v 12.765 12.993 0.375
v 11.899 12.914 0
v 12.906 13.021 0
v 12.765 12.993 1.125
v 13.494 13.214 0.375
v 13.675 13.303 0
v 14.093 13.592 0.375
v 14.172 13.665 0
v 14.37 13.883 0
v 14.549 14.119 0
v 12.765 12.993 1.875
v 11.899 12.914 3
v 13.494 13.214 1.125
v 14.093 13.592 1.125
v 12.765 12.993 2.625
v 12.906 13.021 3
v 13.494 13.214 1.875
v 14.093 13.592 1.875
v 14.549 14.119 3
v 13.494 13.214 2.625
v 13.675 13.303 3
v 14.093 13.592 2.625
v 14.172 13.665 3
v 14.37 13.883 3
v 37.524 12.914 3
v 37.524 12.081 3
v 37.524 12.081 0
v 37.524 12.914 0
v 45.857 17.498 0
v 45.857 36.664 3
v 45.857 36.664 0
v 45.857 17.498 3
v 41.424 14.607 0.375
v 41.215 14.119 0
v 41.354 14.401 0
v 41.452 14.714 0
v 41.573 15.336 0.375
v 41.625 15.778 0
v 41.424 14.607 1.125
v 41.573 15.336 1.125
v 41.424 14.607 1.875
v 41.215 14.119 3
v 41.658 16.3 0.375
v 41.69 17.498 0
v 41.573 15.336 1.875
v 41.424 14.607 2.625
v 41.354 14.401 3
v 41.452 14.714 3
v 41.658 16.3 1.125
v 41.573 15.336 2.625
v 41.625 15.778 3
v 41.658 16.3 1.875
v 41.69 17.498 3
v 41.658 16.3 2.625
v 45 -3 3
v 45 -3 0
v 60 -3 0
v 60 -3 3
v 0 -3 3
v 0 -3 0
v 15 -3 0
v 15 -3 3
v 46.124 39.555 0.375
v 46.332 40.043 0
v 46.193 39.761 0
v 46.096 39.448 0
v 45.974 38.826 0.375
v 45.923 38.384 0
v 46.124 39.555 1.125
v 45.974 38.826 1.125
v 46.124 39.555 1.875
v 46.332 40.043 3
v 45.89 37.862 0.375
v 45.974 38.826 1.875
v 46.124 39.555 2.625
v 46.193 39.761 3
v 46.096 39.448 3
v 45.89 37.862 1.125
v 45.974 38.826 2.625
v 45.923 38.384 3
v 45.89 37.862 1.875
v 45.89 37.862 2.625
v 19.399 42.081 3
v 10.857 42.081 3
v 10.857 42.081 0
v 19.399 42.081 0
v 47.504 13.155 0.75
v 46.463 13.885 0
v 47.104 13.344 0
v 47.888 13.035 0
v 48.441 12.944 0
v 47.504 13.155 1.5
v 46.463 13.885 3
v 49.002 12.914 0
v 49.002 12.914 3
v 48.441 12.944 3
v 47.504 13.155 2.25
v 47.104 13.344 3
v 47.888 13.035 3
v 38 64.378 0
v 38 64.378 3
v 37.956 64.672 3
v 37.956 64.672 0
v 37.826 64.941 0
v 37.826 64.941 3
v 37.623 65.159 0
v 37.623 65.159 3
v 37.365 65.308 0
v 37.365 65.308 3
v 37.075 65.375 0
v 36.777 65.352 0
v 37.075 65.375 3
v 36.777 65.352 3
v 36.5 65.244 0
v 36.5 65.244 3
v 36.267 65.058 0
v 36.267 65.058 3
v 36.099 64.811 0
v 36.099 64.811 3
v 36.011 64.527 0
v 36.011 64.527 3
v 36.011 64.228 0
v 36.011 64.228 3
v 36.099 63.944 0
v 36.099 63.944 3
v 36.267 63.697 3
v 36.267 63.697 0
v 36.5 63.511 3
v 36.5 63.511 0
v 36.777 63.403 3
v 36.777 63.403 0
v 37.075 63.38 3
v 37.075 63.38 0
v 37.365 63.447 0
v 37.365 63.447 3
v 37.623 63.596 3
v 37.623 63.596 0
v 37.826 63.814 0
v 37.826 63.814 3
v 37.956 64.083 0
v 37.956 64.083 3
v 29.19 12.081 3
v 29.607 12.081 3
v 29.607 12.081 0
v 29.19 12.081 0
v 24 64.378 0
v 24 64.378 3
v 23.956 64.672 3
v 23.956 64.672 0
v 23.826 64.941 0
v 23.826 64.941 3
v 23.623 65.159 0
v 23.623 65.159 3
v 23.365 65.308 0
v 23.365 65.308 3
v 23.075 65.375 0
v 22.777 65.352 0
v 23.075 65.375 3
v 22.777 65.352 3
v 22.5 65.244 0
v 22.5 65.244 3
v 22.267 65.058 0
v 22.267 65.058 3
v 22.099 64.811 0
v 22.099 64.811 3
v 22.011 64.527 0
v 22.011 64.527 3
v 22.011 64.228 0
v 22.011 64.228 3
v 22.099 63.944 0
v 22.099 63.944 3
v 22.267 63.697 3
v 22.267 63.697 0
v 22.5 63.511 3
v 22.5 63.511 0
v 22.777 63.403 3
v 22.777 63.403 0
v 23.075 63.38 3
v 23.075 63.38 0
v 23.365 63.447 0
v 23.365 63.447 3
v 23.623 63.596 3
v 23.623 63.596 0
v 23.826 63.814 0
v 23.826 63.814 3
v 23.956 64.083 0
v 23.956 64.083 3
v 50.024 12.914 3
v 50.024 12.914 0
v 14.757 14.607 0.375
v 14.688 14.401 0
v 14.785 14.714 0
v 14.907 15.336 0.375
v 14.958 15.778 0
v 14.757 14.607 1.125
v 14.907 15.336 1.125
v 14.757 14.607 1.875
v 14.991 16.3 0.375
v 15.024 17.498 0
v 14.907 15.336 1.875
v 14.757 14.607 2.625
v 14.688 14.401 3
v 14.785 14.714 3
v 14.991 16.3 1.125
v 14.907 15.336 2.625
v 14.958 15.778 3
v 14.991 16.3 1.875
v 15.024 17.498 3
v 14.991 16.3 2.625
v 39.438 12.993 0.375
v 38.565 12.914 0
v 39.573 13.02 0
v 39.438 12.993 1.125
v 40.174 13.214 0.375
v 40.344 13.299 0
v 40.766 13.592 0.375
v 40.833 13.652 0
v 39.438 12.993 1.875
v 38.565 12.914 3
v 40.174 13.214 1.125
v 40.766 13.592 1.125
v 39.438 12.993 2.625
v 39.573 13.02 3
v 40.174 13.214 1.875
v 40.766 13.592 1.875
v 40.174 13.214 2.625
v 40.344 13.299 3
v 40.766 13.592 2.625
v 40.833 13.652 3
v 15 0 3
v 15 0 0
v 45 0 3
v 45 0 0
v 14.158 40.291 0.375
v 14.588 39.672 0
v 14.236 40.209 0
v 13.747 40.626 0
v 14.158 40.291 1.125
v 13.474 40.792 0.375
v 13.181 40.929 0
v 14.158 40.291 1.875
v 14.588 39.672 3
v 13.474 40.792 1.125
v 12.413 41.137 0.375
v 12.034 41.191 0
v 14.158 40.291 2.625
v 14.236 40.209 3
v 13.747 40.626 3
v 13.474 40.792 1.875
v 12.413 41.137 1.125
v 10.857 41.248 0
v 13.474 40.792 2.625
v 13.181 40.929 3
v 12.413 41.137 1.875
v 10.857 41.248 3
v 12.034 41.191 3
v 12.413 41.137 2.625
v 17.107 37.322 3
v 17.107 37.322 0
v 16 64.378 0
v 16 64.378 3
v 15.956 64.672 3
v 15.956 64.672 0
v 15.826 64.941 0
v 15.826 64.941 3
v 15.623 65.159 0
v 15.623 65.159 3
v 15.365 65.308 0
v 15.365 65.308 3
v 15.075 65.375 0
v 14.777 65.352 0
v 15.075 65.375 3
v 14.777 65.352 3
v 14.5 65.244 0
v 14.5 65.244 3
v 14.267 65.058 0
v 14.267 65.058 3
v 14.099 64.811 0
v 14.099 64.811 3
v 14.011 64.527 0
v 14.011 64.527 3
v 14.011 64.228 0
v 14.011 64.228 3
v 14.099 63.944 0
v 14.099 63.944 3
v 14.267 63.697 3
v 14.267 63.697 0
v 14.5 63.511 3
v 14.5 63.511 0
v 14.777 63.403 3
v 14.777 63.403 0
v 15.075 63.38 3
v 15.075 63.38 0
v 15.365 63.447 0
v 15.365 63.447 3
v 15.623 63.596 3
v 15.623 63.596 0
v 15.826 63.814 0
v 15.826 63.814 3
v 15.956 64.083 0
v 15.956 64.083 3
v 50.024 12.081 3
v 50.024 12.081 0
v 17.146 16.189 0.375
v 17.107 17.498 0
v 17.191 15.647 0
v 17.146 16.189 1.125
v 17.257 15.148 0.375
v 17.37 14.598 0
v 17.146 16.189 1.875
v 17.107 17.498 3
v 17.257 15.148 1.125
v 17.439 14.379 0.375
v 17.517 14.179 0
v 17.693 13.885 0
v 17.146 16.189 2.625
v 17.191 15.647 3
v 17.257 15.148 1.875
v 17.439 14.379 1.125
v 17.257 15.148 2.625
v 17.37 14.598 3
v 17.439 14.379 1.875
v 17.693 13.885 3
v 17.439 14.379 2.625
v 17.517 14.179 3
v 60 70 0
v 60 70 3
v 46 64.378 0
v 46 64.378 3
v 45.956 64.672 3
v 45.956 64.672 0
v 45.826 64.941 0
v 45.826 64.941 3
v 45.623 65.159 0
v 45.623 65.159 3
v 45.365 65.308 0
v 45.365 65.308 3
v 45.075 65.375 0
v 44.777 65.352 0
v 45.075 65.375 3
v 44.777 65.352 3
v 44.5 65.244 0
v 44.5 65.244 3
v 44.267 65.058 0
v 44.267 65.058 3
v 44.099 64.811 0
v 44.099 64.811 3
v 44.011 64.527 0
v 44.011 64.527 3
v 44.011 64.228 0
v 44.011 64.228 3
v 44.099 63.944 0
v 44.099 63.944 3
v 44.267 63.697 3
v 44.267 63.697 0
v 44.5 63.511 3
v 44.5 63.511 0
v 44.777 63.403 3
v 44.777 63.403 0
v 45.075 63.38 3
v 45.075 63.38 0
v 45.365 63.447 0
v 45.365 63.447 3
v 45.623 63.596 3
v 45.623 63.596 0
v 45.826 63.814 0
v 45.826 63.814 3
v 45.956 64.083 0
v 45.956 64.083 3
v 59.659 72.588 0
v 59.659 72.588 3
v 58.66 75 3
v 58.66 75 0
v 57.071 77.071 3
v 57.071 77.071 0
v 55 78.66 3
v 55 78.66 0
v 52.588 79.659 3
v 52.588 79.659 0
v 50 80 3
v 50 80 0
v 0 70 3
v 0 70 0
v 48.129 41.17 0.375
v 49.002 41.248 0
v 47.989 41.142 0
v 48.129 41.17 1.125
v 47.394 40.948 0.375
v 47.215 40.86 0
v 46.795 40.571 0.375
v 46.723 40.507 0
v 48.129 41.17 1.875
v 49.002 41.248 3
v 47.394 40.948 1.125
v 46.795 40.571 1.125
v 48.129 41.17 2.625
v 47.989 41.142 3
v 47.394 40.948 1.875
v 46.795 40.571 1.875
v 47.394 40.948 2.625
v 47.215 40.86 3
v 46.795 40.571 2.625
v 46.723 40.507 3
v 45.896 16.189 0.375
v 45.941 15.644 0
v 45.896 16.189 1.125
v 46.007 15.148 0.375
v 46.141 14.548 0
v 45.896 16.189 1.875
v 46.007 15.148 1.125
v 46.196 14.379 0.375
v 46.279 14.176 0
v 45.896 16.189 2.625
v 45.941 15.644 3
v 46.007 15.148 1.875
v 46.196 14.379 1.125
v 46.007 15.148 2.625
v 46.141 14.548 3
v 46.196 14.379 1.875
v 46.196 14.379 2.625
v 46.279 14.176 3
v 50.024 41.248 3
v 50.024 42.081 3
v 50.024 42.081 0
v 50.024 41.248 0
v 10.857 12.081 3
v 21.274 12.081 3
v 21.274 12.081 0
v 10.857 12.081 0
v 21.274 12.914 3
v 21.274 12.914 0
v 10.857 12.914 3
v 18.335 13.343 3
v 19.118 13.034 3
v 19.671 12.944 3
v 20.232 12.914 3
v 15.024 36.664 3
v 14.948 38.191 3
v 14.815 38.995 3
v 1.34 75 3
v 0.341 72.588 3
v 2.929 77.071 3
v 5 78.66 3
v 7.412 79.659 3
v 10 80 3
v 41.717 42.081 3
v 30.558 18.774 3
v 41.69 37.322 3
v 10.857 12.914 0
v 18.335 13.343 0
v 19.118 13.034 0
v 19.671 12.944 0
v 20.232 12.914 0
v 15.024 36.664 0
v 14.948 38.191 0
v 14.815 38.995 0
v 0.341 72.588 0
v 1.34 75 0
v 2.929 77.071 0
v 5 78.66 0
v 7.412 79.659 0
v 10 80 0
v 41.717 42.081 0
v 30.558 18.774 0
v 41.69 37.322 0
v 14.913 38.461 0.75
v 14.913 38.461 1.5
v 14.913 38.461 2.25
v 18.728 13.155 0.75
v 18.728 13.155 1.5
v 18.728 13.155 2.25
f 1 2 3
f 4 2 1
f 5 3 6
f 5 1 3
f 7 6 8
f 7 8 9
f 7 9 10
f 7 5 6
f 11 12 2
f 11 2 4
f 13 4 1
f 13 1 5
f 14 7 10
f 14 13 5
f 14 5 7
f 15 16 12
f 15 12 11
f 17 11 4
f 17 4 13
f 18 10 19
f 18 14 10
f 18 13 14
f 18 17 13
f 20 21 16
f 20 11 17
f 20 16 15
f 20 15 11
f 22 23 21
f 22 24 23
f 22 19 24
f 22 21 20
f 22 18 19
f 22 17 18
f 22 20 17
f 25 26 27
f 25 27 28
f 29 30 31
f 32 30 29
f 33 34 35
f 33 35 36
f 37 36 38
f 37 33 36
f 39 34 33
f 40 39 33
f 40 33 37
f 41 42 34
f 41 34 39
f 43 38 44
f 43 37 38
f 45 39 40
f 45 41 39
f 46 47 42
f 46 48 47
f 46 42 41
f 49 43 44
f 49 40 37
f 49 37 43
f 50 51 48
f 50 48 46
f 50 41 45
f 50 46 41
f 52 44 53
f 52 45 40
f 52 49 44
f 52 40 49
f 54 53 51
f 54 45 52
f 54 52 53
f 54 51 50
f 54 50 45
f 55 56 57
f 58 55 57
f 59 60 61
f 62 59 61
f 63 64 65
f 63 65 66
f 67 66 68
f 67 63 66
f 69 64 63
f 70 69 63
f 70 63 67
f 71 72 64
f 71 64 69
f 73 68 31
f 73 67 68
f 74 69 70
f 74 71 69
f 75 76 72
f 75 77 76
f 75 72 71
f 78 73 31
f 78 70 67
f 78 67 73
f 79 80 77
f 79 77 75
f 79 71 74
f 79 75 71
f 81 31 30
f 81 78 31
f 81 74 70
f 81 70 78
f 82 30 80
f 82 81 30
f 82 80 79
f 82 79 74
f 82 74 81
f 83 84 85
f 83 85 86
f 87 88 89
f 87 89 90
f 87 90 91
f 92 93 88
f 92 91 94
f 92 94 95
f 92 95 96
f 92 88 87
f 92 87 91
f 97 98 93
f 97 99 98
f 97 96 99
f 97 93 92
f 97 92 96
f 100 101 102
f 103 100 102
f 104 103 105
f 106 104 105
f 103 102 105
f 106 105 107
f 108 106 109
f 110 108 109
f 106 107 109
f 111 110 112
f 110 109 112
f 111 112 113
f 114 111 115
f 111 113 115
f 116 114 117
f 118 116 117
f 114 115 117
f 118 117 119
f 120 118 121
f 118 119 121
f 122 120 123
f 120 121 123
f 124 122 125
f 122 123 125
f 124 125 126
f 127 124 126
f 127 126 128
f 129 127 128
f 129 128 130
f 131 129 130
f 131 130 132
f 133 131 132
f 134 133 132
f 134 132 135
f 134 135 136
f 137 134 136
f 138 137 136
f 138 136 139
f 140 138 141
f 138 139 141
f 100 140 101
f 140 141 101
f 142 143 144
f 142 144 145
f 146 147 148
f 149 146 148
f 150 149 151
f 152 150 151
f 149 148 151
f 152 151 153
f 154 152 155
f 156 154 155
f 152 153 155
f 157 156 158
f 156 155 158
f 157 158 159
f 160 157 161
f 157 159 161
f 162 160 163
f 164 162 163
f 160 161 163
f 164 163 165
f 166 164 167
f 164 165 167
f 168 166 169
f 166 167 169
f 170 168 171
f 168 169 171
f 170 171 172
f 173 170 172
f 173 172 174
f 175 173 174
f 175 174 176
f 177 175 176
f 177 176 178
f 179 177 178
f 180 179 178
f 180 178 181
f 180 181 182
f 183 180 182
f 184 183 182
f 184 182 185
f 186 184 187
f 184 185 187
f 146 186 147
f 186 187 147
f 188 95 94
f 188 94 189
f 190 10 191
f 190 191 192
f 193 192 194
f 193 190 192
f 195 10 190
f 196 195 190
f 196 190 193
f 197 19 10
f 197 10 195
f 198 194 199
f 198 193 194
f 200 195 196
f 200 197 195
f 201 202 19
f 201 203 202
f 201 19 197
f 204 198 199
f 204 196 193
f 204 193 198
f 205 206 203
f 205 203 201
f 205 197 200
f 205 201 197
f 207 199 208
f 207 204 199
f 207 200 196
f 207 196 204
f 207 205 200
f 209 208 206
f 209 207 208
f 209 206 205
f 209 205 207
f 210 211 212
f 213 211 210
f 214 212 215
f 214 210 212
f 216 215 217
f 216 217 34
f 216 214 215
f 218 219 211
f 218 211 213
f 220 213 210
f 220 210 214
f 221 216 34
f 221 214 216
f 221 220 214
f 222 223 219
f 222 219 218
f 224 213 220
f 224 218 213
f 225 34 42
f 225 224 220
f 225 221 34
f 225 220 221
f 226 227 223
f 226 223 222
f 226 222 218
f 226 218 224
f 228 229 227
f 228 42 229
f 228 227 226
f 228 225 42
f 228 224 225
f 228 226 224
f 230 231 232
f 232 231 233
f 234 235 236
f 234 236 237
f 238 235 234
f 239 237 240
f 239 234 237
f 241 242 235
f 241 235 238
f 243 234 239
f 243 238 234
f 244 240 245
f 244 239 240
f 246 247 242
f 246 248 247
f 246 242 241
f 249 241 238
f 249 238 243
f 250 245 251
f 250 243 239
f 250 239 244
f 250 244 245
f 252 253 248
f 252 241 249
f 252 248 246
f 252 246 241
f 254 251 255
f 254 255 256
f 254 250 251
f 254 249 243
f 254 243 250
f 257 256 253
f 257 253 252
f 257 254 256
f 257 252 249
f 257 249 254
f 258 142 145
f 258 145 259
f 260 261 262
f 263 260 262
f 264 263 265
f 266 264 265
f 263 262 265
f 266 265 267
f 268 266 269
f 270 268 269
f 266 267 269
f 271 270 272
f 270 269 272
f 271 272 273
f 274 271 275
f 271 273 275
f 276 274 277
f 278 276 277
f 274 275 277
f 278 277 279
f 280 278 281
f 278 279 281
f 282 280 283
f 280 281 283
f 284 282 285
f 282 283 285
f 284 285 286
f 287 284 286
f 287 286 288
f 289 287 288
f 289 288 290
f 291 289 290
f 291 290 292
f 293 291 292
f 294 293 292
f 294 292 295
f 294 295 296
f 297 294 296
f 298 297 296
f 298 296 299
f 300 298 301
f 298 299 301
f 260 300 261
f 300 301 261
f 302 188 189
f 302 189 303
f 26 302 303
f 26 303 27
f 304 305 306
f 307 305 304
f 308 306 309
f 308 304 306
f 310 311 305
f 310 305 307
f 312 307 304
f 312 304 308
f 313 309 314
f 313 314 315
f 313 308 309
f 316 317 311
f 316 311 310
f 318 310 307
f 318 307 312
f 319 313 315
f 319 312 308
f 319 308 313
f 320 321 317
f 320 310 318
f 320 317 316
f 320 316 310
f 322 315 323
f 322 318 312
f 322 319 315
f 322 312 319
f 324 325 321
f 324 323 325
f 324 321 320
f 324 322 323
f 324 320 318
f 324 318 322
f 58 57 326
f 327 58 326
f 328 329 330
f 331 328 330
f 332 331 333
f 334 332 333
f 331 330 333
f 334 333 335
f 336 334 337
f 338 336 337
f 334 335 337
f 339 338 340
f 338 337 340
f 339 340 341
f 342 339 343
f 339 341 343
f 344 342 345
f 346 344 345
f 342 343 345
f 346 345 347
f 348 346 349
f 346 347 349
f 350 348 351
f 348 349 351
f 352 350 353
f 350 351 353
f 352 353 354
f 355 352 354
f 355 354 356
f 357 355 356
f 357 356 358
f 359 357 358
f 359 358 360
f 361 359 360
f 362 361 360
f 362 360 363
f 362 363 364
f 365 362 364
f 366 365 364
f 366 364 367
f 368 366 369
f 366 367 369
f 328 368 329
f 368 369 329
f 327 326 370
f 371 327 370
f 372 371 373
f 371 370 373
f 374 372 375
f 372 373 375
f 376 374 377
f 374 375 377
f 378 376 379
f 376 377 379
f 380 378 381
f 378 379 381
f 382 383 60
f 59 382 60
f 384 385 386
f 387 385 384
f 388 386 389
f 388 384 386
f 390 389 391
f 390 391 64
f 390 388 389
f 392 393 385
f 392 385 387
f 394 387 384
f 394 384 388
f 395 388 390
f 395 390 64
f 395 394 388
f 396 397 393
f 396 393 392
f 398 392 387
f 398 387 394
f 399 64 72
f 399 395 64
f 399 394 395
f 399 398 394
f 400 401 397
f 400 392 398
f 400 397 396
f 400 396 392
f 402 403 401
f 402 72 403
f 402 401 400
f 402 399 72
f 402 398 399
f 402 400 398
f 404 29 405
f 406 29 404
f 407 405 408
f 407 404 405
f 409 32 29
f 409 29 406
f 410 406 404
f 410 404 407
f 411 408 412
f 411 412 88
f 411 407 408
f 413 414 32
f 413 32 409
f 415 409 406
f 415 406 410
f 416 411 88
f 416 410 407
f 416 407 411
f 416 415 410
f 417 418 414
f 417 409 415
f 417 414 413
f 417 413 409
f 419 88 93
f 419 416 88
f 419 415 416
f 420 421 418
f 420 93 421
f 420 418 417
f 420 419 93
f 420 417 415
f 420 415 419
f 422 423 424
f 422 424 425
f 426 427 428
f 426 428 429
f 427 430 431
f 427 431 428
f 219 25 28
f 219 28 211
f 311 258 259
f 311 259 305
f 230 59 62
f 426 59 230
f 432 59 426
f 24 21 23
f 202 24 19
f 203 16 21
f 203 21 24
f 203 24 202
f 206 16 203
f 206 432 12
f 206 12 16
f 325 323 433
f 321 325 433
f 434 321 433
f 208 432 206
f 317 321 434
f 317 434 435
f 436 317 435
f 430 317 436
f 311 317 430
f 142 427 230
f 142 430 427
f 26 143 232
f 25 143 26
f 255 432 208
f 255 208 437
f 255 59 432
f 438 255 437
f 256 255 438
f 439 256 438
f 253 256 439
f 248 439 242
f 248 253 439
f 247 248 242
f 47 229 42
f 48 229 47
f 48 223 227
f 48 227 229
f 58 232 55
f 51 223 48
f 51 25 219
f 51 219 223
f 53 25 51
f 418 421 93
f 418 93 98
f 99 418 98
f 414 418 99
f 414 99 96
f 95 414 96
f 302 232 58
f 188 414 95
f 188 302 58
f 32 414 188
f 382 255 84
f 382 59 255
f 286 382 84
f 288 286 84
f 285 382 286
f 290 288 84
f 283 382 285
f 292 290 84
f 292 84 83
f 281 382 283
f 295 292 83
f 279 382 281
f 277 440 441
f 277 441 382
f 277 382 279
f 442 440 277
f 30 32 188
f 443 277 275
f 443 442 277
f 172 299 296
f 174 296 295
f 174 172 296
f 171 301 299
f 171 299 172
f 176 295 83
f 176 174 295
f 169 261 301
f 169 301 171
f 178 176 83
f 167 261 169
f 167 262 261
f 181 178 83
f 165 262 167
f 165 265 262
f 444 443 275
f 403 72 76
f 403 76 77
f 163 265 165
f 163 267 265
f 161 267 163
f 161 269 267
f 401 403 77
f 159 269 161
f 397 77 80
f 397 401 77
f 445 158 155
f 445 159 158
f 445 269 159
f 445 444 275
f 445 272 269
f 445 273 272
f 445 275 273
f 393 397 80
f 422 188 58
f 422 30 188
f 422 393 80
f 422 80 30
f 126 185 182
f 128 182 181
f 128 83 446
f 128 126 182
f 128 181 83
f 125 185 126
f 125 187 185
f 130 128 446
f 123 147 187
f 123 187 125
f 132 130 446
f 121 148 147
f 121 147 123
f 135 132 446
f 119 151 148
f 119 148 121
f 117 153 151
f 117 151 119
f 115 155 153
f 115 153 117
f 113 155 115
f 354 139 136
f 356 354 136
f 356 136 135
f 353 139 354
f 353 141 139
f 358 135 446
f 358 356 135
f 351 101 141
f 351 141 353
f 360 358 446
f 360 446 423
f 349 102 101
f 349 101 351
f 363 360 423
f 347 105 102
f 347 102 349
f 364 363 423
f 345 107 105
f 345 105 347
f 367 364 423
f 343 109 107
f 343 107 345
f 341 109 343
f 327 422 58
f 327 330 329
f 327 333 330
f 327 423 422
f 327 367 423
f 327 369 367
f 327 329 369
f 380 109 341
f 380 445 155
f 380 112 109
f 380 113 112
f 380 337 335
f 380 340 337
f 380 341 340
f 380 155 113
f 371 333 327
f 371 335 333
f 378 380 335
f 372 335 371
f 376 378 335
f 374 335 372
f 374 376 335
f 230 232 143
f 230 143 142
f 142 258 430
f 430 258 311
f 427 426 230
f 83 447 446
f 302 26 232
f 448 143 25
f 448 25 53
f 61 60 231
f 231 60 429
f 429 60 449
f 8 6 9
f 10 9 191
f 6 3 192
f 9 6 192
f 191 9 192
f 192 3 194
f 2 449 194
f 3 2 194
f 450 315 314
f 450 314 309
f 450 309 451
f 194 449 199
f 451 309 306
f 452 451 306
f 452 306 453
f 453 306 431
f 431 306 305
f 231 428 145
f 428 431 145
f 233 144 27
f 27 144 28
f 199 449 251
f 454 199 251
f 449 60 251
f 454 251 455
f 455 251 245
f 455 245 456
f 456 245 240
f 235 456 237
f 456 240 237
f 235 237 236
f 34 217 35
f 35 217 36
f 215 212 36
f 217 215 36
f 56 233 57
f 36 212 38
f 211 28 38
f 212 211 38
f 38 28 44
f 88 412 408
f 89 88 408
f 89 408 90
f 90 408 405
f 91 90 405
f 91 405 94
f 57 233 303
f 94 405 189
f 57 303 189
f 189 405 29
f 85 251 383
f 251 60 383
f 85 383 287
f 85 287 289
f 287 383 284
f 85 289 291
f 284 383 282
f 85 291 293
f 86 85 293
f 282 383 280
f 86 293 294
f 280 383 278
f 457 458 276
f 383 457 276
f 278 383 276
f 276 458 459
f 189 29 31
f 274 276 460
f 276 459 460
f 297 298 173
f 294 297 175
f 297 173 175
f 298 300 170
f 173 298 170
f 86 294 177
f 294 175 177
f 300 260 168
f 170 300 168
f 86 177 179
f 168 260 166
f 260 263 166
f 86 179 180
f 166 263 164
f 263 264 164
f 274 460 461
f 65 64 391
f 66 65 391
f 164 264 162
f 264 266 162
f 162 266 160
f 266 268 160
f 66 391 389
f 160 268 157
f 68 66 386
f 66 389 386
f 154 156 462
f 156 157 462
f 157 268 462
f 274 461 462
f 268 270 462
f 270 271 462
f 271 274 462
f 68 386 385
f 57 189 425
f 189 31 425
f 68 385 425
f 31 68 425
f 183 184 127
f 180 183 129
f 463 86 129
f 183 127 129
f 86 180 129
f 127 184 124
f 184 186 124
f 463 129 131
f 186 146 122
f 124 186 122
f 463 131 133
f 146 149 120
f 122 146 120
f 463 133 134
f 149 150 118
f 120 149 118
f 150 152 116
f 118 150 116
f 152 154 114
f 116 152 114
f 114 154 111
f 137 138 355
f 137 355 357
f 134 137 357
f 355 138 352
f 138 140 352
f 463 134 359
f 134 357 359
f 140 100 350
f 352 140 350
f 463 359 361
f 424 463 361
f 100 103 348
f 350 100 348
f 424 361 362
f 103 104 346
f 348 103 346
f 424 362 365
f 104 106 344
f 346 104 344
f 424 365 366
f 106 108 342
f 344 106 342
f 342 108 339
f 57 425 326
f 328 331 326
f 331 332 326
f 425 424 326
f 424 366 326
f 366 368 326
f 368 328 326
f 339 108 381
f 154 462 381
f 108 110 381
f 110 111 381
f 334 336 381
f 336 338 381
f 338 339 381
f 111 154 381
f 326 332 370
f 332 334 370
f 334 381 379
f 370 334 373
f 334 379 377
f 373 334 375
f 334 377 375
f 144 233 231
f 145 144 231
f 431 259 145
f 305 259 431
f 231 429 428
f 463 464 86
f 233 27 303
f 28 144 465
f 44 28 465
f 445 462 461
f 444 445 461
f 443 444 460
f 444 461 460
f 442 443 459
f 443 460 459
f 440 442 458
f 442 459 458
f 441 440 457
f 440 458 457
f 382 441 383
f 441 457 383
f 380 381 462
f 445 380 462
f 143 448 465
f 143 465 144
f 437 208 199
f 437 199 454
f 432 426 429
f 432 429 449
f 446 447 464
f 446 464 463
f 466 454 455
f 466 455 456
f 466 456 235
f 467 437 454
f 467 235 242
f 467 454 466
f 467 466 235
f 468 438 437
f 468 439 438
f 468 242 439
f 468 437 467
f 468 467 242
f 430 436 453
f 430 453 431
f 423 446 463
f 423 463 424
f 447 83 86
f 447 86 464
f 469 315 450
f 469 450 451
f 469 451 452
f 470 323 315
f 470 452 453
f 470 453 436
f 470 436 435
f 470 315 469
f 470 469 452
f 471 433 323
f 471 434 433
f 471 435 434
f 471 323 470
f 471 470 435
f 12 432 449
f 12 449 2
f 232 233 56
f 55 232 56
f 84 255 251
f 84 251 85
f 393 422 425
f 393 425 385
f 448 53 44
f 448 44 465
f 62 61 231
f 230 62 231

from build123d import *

# Parameters (mm, degrees)
BOSS_EXTRUDE1_DEPTH = 3
CUT_EXTRUDE1_DEPTH  = 3
SKETCH3_R           = 1
CUT_EXTRUDE2_DEPTH  = 3


with BuildPart() as part:
    # Sketch1 → Boss-Extrude1 (new body)
    with BuildSketch(Plane.XY):
        with BuildLine():
            Line((15, 0), (45, 0))
            Line((45, 0), (45, -3))
            Line((45, -3), (60, -3))
            Line((60, -3), (60, 0))
            Line((60, 0), (60, 70))
            ThreePointArc((60, 70), (57.071067812, 77.071067812), (50, 80))
            Line((50, 80), (10, 80))
            ThreePointArc((10, 80), (2.928932188, 77.071067812), (0, 70))
            Line((0, 70), (0, 0))
            Line((0, 0), (0, -3))
            Line((0, -3), (15, -3))
            Line((15, -3), (15, 0))
        make_face()
    extrude(amount=BOSS_EXTRUDE1_DEPTH)

    # Sketch2 → Cut-Extrude1 (cut)
    with BuildSketch(Plane.XY.offset(3)):
        with BuildLine():
            Line((29.19049781, 12.081147466), (17.107164477, 37.322032883))
            Line((17.107164477, 37.322032883), (17.107164477, 17.497814133))
            add(Edge.make_bspline(
                [(17.107164477, 17.497814133), (17.106856563, 17.267704948), (17.106272319, 16.831089584), (17.143554032, 16.210481556), (17.183991208, 15.655960439), (17.251147223, 15.170009562), (17.322412489, 14.747387769), (17.428594053, 14.398396218), (17.538951634, 14.108390436), (17.644805439, 13.95466925), (17.693101977, 13.884532883)],
                knots=[0, 0, 0, 0, 1.48973486, 2.826663046, 4.025252461, 5.088590954, 6.003687083, 6.795186099, 7.45029523, 8, 8, 8, 8], degree=3))
            add(Edge.make_bspline(
                [(17.693101977, 13.884532883), (17.840346266, 13.73471353), (18.140195748, 13.429620165), (18.742251873, 13.122863505), (19.450963165, 12.941254282), (19.961816932, 12.923746203), (20.232164477, 12.9144808)],
                knots=[0, 0, 0, 0, 0.893460505, 1.819450328, 2.846037184, 4, 4, 4, 4], degree=3))
            Line((20.232164477, 12.9144808), (21.273831144, 12.9144808))
            Line((21.273831144, 12.9144808), (21.273831144, 12.081147466))
            Line((21.273831144, 12.081147466), (10.857164477, 12.081147466))
            Line((10.857164477, 12.081147466), (10.857164477, 12.9144808))
            Line((10.857164477, 12.9144808), (11.898831144, 12.9144808))
            add(Edge.make_bspline(
                [(11.898831144, 12.9144808), (12.048825145, 12.917755098), (12.339180303, 12.924093413), (12.757070795, 12.986186233), (13.143145766, 13.072376691), (13.494447303, 13.206491265), (13.814309401, 13.373094257), (14.09832336, 13.583510491), (14.341505484, 13.83600194), (14.479050655, 14.023925059), (14.548570727, 14.118907883)],
                knots=[0, 0, 0, 0, 1.182386838, 2.288838982, 3.326958154, 4.296765023, 5.246416275, 6.164047556, 7.072046332, 8, 8, 8, 8], degree=3))
            add(Edge.make_bspline(
                [(14.548570727, 14.118907883), (14.587376699, 14.189630143), (14.672804719, 14.345319134), (14.767344621, 14.622115391), (14.841068835, 14.959225842), (14.914129522, 15.351610192), (14.965303143, 15.806218983), (14.991936983, 16.317094802), (15.023349157, 16.887654031), (15.023664816, 17.28725487), (15.023831144, 17.497814133)],
                knots=[0, 0, 0, 0, 0.561580455, 1.236271222, 2.028879402, 2.966584022, 4.017422664, 5.2149421, 6.532486222, 8, 8, 8, 8], degree=3))
            Line((15.023831144, 17.497814133), (15.023831144, 36.6644808))
            add(Edge.make_bspline(
                [(15.023831144, 36.6644808), (15.02055328, 36.988166413), (15.014467946, 37.589086891), (14.928768358, 38.415621701), (14.807342688, 39.104328259), (14.655869132, 39.495898491), (14.587633227, 39.6722933)],
                knots=[0, 0, 0, 0, 1.269100049, 2.356076937, 3.259444487, 4, 4, 4, 4], degree=3))
            add(Edge.make_bspline(
                [(14.587633227, 39.6722933), (14.530456066, 39.780881674), (14.412829383, 40.004273146), (14.162927878, 40.302631077), (13.844654076, 40.567219507), (13.462503112, 40.813691306), (12.979301958, 41.020762409), (12.378141387, 41.15502888), (11.658107064, 41.237530633), (11.137387273, 41.244216283), (10.857164477, 41.247814133)],
                knots=[0, 0, 0, 0, 0.685675889, 1.410594349, 2.160436148, 2.996293973, 3.94870651, 5.086176952, 6.431940446, 8, 8, 8, 8], degree=3))
            Line((10.857164477, 41.247814133), (10.857164477, 42.081147466))
            Line((10.857164477, 42.081147466), (19.398831144, 42.081147466))
            Line((19.398831144, 42.081147466), (30.55768531, 18.7738558))
            Line((30.55768531, 18.7738558), (41.716539477, 42.081147466))
            Line((41.716539477, 42.081147466), (50.023831144, 42.081147466))
            Line((50.023831144, 42.081147466), (50.023831144, 41.247814133))
            Line((50.023831144, 41.247814133), (49.001695727, 41.247814133))
            add(Edge.make_bspline(
                [(49.001695727, 41.247814133), (48.849510318, 41.244694592), (48.556943778, 41.238697479), (48.135006283, 41.175164667), (47.746219832, 41.091107105), (47.393177435, 40.955606693), (47.072846278, 40.789567822), (46.789193443, 40.576638492), (46.539300059, 40.328607353), (46.401580276, 40.138732081), (46.332424894, 40.04338705)],
                knots=[0, 0, 0, 0, 1.192663738, 2.292818382, 3.341598875, 4.305885976, 5.250132179, 6.162540657, 7.077327887, 8, 8, 8, 8], degree=3))
            add(Edge.make_bspline(
                [(46.332424894, 40.04338705), (46.293618922, 39.97266479), (46.208190902, 39.816975798), (46.113651, 39.540179542), (46.039926786, 39.20306909), (45.966866099, 38.810684741), (45.915692478, 38.35607595), (45.889058638, 37.845200131), (45.857646464, 37.274640902), (45.857330805, 36.875040062), (45.857164477, 36.6644808)],
                knots=[0, 0, 0, 0, 0.561580455, 1.236271222, 2.028879402, 2.966584022, 4.017422664, 5.2149421, 6.532486222, 8, 8, 8, 8], degree=3))
            Line((45.857164477, 36.6644808), (45.857164477, 17.497814133))
            add(Edge.make_bspline(
                [(45.857164477, 17.497814133), (45.856887283, 17.267711351), (45.856361328, 16.831108136), (45.893253556, 16.210418928), (45.934944838, 15.656159203), (45.99825562, 15.168982955), (46.081396816, 14.748408827), (46.183028471, 14.396778863), (46.302123125, 14.10774347), (46.412242488, 13.95460789), (46.462633227, 13.884532883)],
                knots=[0, 0, 0, 0, 1.486776415, 2.821049613, 4.017258766, 5.078485589, 5.994452933, 6.784380121, 7.443731031, 8, 8, 8, 8], degree=3))
            add(Edge.make_bspline(
                [(46.462633227, 13.884532883), (46.609751164, 13.734446531), (46.910693137, 13.427432419), (47.515250463, 13.125895229), (48.222218515, 12.940045729), (48.731216692, 12.923351845), (49.001695727, 12.9144808)],
                knots=[0, 0, 0, 0, 0.893634595, 1.828003868, 2.845812335, 4, 4, 4, 4], degree=3))
            Line((49.001695727, 12.9144808), (50.023831144, 12.9144808))
            Line((50.023831144, 12.9144808), (50.023831144, 12.081147466))
            Line((50.023831144, 12.081147466), (37.523831144, 12.081147466))
            Line((37.523831144, 12.081147466), (37.523831144, 12.9144808))
            Line((37.523831144, 12.9144808), (38.56549781, 12.9144808))
            add(Edge.make_bspline(
                [(38.56549781, 12.9144808), (38.717654175, 12.917695974), (39.010164878, 12.923876936), (39.430396151, 12.985823667), (39.817804477, 13.074062693), (40.171351147, 13.203103474), (40.488581605, 13.375227668), (40.771335549, 13.583465527), (41.01486323, 13.834271299), (41.148211479, 14.02369587), (41.215237394, 14.118907883)],
                knots=[0, 0, 0, 0, 1.198333024, 2.303717216, 3.340834392, 4.325725627, 5.259386468, 6.176132048, 7.08325442, 8, 8, 8, 8], degree=3))
            add(Edge.make_bspline(
                [(41.215237394, 14.118907883), (41.254043366, 14.189630143), (41.339471385, 14.345319134), (41.434011288, 14.622115391), (41.507735502, 14.959225842), (41.580796189, 15.351610192), (41.631969809, 15.806218983), (41.658603649, 16.317094802), (41.690015823, 16.887654031), (41.690331482, 17.28725487), (41.69049781, 17.497814133)],
                knots=[0, 0, 0, 0, 0.561580455, 1.236271222, 2.028879402, 2.966584022, 4.017422664, 5.2149421, 6.532486222, 8, 8, 8, 8], degree=3))
            Line((41.69049781, 17.497814133), (41.69049781, 37.322032883))
            Line((41.69049781, 37.322032883), (29.607164477, 12.081147466))
            Line((29.607164477, 12.081147466), (29.19049781, 12.081147466))
        make_face()
    extrude(amount=-CUT_EXTRUDE1_DEPTH, mode=Mode.SUBTRACT)

    # Sketch3 → Cut-Extrude2 (cut)
    with BuildSketch(Plane.XY.offset(3)):
        with Locations((15, 64.377519573)):
            Circle(SKETCH3_R)
        with Locations((45, 64.377519573)):
            Circle(SKETCH3_R)
        with Locations((23, 64.377519573)):
            Circle(SKETCH3_R)
        with Locations((37, 64.377519573)):
            Circle(SKETCH3_R)
    extrude(amount=-CUT_EXTRUDE2_DEPTH, mode=Mode.SUBTRACT)


solid = part.part
